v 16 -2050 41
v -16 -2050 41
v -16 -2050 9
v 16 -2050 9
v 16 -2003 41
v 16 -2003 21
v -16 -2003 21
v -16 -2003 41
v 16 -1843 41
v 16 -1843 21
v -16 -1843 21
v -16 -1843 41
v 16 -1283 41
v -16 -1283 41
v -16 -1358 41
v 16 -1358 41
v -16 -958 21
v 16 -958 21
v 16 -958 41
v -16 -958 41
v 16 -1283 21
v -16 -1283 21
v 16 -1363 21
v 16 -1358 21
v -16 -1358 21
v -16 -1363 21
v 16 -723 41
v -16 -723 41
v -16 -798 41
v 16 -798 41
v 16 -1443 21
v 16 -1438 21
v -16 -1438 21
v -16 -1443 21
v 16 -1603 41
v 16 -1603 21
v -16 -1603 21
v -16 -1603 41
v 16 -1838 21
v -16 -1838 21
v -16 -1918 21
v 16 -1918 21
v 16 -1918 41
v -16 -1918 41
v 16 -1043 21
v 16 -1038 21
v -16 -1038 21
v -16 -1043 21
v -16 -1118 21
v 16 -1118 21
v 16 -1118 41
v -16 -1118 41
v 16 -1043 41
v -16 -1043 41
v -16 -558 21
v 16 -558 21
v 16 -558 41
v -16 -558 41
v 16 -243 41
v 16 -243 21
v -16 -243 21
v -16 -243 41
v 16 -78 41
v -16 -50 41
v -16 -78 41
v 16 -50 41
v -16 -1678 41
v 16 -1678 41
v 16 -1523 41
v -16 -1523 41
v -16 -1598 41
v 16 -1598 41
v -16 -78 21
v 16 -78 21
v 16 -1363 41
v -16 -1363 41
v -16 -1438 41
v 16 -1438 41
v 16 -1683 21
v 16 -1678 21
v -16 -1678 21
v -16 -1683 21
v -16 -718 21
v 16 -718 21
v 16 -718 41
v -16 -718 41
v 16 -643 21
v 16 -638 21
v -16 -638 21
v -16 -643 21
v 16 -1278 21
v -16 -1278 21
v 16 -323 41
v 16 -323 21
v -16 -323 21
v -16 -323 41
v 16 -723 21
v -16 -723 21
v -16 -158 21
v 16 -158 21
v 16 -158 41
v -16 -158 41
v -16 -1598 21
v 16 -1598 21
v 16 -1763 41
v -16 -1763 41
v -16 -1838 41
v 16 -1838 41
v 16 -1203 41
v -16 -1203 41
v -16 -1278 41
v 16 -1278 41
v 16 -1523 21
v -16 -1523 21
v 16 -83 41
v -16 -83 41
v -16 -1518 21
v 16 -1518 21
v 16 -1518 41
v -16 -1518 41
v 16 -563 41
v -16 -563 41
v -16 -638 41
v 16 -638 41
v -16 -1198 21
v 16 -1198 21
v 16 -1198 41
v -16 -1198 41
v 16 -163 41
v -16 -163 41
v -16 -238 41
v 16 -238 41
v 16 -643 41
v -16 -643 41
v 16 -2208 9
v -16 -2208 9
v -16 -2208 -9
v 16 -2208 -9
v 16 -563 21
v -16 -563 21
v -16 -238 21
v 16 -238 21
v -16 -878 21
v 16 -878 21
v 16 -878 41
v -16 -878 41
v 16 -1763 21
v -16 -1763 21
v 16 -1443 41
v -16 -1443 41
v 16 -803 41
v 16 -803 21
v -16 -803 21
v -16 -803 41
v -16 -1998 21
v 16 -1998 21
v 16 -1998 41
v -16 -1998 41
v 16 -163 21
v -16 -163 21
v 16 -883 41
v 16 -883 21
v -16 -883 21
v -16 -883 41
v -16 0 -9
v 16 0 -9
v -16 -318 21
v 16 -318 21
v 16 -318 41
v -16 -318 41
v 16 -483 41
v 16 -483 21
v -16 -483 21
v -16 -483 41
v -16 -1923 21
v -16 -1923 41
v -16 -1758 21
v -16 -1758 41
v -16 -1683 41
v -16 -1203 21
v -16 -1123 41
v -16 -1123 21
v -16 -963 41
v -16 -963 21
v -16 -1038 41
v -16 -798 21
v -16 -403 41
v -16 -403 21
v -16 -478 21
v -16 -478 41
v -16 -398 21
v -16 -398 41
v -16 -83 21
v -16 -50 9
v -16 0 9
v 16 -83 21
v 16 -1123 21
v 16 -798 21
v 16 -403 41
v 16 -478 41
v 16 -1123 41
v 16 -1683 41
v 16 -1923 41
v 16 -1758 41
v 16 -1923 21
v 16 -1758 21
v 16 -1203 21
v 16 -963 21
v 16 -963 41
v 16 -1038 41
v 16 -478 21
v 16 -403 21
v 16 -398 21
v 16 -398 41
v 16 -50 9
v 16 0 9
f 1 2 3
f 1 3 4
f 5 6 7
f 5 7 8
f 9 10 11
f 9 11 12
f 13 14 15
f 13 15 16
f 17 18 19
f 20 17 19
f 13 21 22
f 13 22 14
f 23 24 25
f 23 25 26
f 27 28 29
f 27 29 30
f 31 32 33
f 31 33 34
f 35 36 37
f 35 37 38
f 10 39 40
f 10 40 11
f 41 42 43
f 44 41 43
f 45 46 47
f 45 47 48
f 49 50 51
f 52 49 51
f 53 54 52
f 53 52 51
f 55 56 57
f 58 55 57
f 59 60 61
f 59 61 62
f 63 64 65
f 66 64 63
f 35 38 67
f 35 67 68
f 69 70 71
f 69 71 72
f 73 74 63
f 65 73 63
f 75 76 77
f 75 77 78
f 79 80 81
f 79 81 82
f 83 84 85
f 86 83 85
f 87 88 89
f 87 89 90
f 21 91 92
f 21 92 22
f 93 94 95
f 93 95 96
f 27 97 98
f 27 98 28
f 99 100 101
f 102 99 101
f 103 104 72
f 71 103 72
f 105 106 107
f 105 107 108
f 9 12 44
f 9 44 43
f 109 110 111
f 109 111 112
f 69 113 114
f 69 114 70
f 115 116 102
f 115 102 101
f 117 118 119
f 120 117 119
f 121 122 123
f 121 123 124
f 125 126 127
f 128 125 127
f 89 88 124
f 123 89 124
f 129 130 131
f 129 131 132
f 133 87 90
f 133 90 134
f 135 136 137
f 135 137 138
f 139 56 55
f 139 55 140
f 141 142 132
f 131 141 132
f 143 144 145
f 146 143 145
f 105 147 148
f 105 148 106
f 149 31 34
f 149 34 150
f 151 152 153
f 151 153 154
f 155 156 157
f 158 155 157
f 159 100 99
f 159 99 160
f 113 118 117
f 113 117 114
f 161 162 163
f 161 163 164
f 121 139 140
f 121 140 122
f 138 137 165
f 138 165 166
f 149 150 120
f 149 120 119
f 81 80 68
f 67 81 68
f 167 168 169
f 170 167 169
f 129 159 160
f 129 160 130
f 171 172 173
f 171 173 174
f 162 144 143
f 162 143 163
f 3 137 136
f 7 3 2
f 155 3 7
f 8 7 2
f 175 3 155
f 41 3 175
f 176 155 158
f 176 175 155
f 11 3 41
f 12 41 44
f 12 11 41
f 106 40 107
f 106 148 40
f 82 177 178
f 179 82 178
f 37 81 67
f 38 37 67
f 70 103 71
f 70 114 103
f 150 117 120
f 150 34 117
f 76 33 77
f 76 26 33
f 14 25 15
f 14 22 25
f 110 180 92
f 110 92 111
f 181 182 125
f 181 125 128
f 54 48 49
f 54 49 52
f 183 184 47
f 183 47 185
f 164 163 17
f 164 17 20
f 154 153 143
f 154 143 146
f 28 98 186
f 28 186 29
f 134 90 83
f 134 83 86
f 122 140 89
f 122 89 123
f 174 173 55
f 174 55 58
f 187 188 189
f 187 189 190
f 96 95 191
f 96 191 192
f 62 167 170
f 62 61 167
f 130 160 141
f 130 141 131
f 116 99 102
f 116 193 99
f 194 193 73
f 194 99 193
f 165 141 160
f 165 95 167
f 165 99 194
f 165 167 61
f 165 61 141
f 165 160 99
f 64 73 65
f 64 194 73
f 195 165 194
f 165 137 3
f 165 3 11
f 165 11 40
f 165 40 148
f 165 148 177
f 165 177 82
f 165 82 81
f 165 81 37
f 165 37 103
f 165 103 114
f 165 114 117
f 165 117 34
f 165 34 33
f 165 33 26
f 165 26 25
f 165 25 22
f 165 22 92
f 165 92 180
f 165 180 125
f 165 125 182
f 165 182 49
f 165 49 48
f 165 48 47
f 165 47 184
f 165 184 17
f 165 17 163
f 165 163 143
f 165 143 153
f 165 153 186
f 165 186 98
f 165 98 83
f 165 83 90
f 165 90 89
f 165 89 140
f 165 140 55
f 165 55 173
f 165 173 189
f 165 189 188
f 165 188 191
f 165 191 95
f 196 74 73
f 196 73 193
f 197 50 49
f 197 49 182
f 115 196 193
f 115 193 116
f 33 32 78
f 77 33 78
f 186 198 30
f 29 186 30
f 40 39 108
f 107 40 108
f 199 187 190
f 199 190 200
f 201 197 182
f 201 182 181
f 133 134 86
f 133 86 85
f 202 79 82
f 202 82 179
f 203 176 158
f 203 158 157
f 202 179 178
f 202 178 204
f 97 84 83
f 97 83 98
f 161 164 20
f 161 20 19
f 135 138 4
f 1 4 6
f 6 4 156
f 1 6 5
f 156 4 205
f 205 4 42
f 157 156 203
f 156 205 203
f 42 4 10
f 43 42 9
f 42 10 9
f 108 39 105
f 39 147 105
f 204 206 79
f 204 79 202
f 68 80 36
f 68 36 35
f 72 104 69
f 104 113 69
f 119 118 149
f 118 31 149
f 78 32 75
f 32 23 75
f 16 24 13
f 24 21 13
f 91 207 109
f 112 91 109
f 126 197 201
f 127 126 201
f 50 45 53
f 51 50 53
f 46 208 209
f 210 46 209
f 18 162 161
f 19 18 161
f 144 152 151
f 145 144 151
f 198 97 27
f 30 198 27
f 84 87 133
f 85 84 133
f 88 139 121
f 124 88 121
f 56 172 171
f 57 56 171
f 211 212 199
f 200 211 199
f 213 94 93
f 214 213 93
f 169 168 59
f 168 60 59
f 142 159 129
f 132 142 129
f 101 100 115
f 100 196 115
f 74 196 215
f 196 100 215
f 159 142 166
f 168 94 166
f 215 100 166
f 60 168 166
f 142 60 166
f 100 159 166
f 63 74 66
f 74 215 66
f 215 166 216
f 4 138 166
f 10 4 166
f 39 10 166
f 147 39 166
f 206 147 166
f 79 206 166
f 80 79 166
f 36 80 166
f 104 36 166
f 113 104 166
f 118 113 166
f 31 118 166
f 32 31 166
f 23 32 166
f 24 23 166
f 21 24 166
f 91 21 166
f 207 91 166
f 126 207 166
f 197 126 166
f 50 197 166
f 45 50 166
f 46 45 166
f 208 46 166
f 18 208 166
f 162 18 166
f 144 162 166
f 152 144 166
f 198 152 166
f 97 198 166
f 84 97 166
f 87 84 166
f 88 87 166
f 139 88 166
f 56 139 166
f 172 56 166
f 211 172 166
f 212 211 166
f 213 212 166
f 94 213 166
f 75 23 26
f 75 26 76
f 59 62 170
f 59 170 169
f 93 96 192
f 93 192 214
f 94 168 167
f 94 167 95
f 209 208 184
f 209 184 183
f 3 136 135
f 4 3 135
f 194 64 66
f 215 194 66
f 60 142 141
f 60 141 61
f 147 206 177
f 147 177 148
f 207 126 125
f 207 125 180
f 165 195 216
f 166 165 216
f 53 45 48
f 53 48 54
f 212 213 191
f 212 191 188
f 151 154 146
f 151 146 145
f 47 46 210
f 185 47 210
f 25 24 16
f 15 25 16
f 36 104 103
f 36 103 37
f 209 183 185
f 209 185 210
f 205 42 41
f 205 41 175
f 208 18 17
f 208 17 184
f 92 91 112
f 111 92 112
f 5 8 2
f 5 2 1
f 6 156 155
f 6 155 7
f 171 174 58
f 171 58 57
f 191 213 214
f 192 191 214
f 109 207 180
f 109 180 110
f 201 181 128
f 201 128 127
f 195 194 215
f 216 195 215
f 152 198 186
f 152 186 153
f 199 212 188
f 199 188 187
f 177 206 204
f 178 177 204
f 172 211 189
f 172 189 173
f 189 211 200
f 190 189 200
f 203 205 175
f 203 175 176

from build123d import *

# Parameters (mm, degrees)
F0_W     = 32
F0_H     = 18
F1_DEPTH = 2208
F3_W     = 32
F3_H     = 32
F4_DEPTH = 2000
F5_W     = 5
F5_H     = 31
F6_DEPTH = 32


with BuildPart() as f1:
    # F0 (on Front) → F1 (new body)
    with BuildSketch(Plane.XZ):
        Rectangle(F0_W, F0_H)
    extrude(amount=F1_DEPTH)

    # F3 (on offset) → F4 (join)
    with BuildSketch(Plane.XZ.offset(50)):
        with Locations((0, 25)):
            Rectangle(F3_W, F3_H)
    extrude(amount=F4_DEPTH)

    # F5 (on face) → F6 (cut)
    with BuildSketch(Plane(origin=(-16, 0, 0), x_dir=(0, -1, 0), z_dir=(-1, 0, 0))):
        with Locations((80.5, 36.5)):
            Rectangle(F5_W, F5_H)
        with Locations((160.5, 36.5)):
            Rectangle(F5_W, F5_H)
        with Locations((240.5, 36.5)):
            Rectangle(F5_W, F5_H)
        with Locations((320.5, 36.5)):
            Rectangle(F5_W, F5_H)
        with Locations((400.5, 36.5)):
            Rectangle(F5_W, F5_H)
        with Locations((480.5, 36.5)):
            Rectangle(F5_W, F5_H)
        with Locations((560.5, 36.5)):
            Rectangle(F5_W, F5_H)
        with Locations((640.5, 36.5)):
            Rectangle(F5_W, F5_H)
        with Locations((720.5, 36.5)):
            Rectangle(F5_W, F5_H)
        with Locations((800.5, 36.5)):
            Rectangle(F5_W, F5_H)
        with Locations((880.5, 36.5)):
            Rectangle(F5_W, F5_H)
        with Locations((960.5, 36.5)):
            Rectangle(F5_W, F5_H)
        with Locations((1040.5, 36.5)):
            Rectangle(F5_W, F5_H)
        with Locations((1120.5, 36.5)):
            Rectangle(F5_W, F5_H)
        with Locations((1200.5, 36.5)):
            Rectangle(F5_W, F5_H)
        with Locations((1280.5, 36.5)):
            Rectangle(F5_W, F5_H)
        with Locations((1360.5, 36.5)):
            Rectangle(F5_W, F5_H)
        with Locations((1440.5, 36.5)):
            Rectangle(F5_W, F5_H)
        with Locations((1520.5, 36.5)):
            Rectangle(F5_W, F5_H)
        with Locations((1600.5, 36.5)):
            Rectangle(F5_W, F5_H)
        with Locations((1680.5, 36.5)):
            Rectangle(F5_W, F5_H)
        with Locations((1760.5, 36.5)):
            Rectangle(F5_W, F5_H)
        with Locations((1840.5, 36.5)):
            Rectangle(F5_W, F5_H)
        with Locations((1920.5, 36.5)):
            Rectangle(F5_W, F5_H)
        with Locations((2000.5, 36.5)):
            Rectangle(F5_W, F5_H)
    extrude(amount=-F6_DEPTH, mode=Mode.SUBTRACT)


solid = f1.part
